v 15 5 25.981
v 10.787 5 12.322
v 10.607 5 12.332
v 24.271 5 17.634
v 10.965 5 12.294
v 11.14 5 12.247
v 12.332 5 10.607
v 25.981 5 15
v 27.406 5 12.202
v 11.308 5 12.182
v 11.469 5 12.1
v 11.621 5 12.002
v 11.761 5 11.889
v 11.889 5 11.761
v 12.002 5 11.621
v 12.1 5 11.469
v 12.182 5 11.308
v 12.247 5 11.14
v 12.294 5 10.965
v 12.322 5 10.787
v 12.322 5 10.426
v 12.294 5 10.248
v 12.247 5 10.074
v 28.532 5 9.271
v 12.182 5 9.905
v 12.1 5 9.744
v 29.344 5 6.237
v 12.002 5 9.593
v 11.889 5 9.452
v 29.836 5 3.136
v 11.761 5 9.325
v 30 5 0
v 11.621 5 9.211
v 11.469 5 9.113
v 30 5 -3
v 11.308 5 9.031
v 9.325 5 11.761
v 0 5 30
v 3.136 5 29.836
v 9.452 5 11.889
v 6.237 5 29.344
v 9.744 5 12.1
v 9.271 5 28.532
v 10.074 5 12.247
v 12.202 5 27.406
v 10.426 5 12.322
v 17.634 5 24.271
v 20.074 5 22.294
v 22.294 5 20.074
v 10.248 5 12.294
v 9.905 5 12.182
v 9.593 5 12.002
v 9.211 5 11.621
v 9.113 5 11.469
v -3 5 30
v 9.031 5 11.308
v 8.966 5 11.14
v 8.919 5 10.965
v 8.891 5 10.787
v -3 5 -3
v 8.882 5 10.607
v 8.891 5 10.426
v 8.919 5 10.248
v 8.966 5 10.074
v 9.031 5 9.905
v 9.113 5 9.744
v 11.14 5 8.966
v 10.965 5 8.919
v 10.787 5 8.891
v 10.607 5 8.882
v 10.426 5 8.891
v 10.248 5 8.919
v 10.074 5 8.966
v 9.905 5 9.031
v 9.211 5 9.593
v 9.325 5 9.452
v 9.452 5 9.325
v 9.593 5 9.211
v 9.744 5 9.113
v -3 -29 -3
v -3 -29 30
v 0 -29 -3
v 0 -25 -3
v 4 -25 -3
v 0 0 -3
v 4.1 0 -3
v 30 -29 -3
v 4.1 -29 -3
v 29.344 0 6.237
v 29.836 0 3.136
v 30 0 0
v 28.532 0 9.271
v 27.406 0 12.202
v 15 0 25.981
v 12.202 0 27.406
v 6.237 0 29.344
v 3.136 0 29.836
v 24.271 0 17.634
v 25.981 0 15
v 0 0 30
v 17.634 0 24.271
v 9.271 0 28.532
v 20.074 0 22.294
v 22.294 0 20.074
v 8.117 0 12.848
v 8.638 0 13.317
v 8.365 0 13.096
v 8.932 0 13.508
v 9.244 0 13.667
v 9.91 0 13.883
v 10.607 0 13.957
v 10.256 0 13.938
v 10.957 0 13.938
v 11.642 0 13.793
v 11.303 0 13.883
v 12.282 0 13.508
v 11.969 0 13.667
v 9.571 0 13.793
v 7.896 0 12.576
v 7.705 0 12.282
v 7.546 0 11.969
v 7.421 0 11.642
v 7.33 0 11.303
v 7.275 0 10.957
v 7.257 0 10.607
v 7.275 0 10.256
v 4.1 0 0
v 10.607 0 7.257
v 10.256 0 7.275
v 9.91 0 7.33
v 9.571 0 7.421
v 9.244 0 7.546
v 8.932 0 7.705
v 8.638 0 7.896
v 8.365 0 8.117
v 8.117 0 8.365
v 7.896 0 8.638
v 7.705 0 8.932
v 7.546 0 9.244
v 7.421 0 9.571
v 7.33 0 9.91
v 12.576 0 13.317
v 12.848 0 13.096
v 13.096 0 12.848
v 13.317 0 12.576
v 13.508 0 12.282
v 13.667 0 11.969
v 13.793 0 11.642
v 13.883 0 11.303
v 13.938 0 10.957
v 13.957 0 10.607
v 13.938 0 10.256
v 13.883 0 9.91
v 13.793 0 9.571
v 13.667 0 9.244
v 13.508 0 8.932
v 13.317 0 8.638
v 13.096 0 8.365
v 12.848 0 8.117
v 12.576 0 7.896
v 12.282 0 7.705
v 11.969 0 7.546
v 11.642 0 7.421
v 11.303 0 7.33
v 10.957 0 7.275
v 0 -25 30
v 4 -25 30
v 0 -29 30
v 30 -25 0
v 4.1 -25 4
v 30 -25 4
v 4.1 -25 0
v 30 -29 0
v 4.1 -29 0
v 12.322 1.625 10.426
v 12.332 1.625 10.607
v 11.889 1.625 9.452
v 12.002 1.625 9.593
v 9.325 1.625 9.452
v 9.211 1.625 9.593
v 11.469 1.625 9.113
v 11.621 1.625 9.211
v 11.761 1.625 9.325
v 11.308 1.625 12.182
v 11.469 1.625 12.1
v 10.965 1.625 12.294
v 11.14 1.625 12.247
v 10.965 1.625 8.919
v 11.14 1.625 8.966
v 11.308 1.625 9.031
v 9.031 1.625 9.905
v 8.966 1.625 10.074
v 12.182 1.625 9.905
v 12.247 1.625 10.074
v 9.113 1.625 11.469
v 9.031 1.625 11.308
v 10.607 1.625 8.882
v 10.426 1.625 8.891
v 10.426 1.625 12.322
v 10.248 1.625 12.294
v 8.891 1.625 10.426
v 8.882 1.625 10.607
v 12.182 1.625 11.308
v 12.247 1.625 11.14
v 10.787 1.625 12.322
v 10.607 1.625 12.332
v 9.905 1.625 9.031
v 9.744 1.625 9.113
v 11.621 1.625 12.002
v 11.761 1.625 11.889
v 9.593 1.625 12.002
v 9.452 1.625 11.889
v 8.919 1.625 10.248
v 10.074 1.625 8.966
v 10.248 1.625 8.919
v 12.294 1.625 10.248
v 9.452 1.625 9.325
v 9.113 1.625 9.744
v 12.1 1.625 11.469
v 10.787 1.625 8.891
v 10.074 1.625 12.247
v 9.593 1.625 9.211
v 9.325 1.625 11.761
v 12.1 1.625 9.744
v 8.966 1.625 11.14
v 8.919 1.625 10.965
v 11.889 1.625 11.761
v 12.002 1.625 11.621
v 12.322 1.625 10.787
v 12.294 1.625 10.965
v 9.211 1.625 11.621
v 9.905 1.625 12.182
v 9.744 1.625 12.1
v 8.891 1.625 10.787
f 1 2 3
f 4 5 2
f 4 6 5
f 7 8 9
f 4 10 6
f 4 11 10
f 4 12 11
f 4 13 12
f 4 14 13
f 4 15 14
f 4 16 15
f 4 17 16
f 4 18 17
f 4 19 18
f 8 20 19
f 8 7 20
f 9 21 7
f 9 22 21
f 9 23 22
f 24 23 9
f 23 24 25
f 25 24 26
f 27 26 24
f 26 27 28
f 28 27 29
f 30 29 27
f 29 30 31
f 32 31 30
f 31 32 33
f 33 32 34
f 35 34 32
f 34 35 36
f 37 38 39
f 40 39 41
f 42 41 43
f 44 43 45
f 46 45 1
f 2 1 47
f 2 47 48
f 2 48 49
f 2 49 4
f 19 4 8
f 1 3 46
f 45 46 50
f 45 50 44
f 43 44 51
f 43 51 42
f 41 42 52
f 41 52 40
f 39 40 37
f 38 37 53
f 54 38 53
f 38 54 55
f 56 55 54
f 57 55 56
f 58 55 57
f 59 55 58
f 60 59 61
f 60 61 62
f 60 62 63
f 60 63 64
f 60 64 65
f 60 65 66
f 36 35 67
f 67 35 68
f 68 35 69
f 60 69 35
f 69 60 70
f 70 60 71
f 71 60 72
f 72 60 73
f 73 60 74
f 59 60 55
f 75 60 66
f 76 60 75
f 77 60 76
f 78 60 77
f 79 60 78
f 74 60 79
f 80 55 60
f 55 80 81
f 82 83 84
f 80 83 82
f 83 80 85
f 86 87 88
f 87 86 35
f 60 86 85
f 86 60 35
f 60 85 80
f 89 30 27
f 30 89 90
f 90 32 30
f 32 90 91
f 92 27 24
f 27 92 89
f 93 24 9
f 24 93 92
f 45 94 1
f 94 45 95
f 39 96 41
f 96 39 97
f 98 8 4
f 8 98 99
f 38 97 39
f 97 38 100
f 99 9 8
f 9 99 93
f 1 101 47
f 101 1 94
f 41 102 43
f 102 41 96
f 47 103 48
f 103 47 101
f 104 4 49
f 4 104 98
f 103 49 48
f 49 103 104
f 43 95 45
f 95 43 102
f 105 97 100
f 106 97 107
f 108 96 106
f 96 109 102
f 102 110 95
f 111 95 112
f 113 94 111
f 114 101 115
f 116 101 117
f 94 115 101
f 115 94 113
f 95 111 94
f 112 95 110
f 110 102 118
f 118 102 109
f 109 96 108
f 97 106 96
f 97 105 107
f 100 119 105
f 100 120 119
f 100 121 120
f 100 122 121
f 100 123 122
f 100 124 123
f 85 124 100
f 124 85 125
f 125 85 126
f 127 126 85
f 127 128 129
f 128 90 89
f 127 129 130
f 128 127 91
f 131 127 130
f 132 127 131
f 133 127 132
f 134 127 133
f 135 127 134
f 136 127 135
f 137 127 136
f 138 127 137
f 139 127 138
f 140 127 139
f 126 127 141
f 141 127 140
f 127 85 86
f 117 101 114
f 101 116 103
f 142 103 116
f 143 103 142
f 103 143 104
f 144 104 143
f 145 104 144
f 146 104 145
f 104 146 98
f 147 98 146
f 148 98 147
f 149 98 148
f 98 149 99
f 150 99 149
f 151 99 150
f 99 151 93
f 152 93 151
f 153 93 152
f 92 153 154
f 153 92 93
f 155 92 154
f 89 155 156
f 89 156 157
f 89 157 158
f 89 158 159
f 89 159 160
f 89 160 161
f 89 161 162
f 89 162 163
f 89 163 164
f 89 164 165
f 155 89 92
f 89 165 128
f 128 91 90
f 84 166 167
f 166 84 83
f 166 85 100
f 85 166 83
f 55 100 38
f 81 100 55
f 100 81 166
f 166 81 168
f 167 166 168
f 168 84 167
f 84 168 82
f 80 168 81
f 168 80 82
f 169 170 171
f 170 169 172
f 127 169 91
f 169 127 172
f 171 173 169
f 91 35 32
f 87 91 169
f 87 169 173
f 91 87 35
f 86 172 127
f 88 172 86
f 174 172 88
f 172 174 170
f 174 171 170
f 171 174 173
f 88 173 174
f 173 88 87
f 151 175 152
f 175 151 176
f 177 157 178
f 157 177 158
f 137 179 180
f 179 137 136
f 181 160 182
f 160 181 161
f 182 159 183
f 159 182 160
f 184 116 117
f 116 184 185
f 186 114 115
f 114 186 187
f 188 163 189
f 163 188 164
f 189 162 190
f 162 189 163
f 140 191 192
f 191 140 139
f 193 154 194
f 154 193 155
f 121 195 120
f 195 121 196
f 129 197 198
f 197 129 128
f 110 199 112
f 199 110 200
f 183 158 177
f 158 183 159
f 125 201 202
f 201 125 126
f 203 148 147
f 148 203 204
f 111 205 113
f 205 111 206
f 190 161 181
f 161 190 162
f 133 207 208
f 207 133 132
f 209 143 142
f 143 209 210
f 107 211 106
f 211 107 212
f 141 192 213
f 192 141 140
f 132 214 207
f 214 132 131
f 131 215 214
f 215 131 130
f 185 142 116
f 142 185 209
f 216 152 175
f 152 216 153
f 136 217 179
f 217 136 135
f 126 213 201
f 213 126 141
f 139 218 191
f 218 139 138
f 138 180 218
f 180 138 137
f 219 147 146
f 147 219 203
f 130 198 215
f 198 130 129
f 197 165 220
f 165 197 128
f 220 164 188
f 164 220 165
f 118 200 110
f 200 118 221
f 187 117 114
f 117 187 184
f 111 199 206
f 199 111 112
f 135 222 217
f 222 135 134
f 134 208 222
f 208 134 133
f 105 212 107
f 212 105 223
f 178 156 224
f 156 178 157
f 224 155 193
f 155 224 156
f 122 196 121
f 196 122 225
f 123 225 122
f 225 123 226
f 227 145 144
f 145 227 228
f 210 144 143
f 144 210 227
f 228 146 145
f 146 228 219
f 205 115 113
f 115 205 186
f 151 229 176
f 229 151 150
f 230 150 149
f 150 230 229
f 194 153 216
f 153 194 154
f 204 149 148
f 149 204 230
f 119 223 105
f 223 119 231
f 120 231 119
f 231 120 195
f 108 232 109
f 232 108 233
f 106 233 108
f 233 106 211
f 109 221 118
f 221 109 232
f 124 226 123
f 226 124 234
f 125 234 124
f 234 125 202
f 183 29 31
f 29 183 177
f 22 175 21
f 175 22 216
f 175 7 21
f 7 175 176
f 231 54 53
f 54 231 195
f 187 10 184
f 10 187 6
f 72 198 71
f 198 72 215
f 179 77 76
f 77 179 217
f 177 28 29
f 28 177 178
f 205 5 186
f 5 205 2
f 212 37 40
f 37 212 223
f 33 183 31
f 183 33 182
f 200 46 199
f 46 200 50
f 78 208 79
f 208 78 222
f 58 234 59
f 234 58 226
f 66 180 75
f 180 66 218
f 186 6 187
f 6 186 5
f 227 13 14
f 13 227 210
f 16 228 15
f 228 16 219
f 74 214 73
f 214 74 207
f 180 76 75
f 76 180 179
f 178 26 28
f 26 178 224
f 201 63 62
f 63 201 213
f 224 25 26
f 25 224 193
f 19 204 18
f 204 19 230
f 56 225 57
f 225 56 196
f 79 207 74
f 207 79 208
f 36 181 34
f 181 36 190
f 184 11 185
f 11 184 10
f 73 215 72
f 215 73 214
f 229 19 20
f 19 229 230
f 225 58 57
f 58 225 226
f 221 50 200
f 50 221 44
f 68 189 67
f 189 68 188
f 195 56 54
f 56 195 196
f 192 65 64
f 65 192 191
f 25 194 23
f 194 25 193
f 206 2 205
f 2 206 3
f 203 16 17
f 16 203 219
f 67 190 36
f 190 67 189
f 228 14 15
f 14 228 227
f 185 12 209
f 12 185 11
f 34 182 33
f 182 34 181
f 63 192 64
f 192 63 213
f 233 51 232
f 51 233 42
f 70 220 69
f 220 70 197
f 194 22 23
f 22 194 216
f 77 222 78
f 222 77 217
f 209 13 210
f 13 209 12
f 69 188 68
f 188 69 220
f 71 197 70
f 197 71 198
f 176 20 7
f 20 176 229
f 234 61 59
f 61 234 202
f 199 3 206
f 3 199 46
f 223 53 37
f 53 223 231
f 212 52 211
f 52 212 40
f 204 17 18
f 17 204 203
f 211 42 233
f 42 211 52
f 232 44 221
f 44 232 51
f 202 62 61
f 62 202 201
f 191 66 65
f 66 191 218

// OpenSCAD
// 3D Printable Surface Mount
// Copyright (C) 2017  Daniel Benoy  <daniel@benoy.name>
//
// This program is free software: you can redistribute it and/or modify
// it under the terms of the GNU General Public License as published by
// the Free Software Foundation, either version 3 of the License, or
// (at your option) any later version.
// 
// This program is distributed in the hope that it will be useful,
// but WITHOUT ANY WARRANTY; without even the implied warranty of
// MERCHANTABILITY or FITNESS FOR A PARTICULAR PURPOSE.  See the
// GNU General Public License for more details.
// 
// You should have received a copy of the GNU General Public License
// along with this program.  If not, see <http://www.gnu.org/licenses/>.

$fn=60;

//CUSTOMIZER VARIABLES

// Whether to place an edge holder on the side(s) of the stand
type = 0; // [0:Corner, 1:Side]

// The width of the entire bracket not counting the clip thickness
bracket_width=30;

// The thickness of the clips (the parts that grip on the object with the tooth on top)
clip_thickness=3;

// How deep and tall the teeth are
tooth_size=4;

// The height of the object that will be put in the bracket
height=25;

// The thickness of the base of the object (Make sure it's thick enough to accomodate your desired screw size)
base_thickness=5;

// The diameter of the screw hole
screw_diameter=3.45;

// The diameter of the head of the screw (For countersinking)
screw_head_diameter=6.9;

// The separation tolerance (This is to prevent things from fusing together that aren't supposed to, and will depend on your printer. You probably don't have to change this)
tolerence=0.1;

//CUSTOMIZER VARIABLES END


module clip(width, height, thickness, tooth_size) {
    cube([thickness, width, height + tooth_size]);
    translate([thickness, 0, 0]) translate([0, 0, height]) intersection() {
        cube([tooth_size, width, tooth_size]);
        translate([0, 0, tooth_size]) rotate([0, 135, 0]) cube([tooth_size * sqrt(2), width, tooth_size * sqrt(2)]);
    }
}

module fh_screw_hole(diameter, head_diameter, length) {
    cylinder(d1=head_diameter, d2=0, h=head_diameter/2);
    cylinder(d=diameter, h=length);
}

module surface_mount_corner(
    tolerence=tolerence,
    bracket_width=bracket_width,
    height=height,
    base_thickness=base_thickness,
    clip_thickness=clip_thickness,
    tooth_size=tooth_size,
    screw_diameter=screw_diameter,
    screw_head_diameter=screw_head_diameter
) {
    rotate([90, 0, 0]) translate([-clip_thickness, -clip_thickness, -base_thickness]) difference() {
        union() {
            intersection() {
                cube([clip_thickness + bracket_width, clip_thickness + bracket_width, height + tooth_size + base_thickness]);
                translate([clip_thickness, clip_thickness, 0]) cylinder(h=height + tooth_size + base_thickness, r=bracket_width);
                cube([bracket_width + clip_thickness, bracket_width + clip_thickness, base_thickness]);
            }
            clip(width=bracket_width + clip_thickness, height=height + base_thickness, thickness=clip_thickness, tooth_size=tooth_size);
            translate([clip_thickness + tooth_size + tolerence, 0, 0]) mirror([1, 0, 0]) rotate([0, 0, 90]) clip(width=bracket_width - tooth_size - tolerence, height=height + base_thickness, thickness=clip_thickness, tooth_size=tooth_size);
        }
        translate([bracket_width * cos(45) / 2 + clip_thickness, bracket_width * sin(45) / 2 + clip_thickness, base_thickness + 0.1]) rotate([180, 0, 0]) fh_screw_hole(diameter=screw_diameter, head_diameter=screw_head_diameter, length=base_thickness+0.2);
    }
}

module surface_mount_side(
    bracket_width=bracket_width,
    height=height,
    base_thickness=base_thickness,
    clip_thickness=clip_thickness,
    tooth_size=tooth_size,
    screw_diameter=screw_diameter,
    screw_head_diameter=screw_head_diameter
) {
    rotate([90, 0, 0]) translate([-clip_thickness, 0, -base_thickness]) difference() {
        intersection() {
            cube([bracket_width + clip_thickness, bracket_width + clip_thickness, height + tooth_size + base_thickness]);
            union() {
                cube([bracket_width/3 + clip_thickness, bracket_width, height + tooth_size + base_thickness]);
                translate([bracket_width/3 + clip_thickness, bracket_width/2, 0]) cylinder(h=height + tooth_size + base_thickness, d=bracket_width);
            }
            union() {
                cube([bracket_width + clip_thickness, bracket_width, base_thickness]);
                translate([0, 0, base_thickness]) clip(width=bracket_width, height=height, thickness=clip_thickness, tooth_size=tooth_size);
            }
        }
        translate([clip_thickness + bracket_width/2.5, bracket_width/2, base_thickness + 0.1]) rotate([180, 0, 0]) fh_screw_hole(diameter=screw_diameter, head_diameter=screw_head_diameter, length=base_thickness+0.2);
    }
}

if (type == 0) {
    surface_mount_corner();
} else {
    surface_mount_side();
}
